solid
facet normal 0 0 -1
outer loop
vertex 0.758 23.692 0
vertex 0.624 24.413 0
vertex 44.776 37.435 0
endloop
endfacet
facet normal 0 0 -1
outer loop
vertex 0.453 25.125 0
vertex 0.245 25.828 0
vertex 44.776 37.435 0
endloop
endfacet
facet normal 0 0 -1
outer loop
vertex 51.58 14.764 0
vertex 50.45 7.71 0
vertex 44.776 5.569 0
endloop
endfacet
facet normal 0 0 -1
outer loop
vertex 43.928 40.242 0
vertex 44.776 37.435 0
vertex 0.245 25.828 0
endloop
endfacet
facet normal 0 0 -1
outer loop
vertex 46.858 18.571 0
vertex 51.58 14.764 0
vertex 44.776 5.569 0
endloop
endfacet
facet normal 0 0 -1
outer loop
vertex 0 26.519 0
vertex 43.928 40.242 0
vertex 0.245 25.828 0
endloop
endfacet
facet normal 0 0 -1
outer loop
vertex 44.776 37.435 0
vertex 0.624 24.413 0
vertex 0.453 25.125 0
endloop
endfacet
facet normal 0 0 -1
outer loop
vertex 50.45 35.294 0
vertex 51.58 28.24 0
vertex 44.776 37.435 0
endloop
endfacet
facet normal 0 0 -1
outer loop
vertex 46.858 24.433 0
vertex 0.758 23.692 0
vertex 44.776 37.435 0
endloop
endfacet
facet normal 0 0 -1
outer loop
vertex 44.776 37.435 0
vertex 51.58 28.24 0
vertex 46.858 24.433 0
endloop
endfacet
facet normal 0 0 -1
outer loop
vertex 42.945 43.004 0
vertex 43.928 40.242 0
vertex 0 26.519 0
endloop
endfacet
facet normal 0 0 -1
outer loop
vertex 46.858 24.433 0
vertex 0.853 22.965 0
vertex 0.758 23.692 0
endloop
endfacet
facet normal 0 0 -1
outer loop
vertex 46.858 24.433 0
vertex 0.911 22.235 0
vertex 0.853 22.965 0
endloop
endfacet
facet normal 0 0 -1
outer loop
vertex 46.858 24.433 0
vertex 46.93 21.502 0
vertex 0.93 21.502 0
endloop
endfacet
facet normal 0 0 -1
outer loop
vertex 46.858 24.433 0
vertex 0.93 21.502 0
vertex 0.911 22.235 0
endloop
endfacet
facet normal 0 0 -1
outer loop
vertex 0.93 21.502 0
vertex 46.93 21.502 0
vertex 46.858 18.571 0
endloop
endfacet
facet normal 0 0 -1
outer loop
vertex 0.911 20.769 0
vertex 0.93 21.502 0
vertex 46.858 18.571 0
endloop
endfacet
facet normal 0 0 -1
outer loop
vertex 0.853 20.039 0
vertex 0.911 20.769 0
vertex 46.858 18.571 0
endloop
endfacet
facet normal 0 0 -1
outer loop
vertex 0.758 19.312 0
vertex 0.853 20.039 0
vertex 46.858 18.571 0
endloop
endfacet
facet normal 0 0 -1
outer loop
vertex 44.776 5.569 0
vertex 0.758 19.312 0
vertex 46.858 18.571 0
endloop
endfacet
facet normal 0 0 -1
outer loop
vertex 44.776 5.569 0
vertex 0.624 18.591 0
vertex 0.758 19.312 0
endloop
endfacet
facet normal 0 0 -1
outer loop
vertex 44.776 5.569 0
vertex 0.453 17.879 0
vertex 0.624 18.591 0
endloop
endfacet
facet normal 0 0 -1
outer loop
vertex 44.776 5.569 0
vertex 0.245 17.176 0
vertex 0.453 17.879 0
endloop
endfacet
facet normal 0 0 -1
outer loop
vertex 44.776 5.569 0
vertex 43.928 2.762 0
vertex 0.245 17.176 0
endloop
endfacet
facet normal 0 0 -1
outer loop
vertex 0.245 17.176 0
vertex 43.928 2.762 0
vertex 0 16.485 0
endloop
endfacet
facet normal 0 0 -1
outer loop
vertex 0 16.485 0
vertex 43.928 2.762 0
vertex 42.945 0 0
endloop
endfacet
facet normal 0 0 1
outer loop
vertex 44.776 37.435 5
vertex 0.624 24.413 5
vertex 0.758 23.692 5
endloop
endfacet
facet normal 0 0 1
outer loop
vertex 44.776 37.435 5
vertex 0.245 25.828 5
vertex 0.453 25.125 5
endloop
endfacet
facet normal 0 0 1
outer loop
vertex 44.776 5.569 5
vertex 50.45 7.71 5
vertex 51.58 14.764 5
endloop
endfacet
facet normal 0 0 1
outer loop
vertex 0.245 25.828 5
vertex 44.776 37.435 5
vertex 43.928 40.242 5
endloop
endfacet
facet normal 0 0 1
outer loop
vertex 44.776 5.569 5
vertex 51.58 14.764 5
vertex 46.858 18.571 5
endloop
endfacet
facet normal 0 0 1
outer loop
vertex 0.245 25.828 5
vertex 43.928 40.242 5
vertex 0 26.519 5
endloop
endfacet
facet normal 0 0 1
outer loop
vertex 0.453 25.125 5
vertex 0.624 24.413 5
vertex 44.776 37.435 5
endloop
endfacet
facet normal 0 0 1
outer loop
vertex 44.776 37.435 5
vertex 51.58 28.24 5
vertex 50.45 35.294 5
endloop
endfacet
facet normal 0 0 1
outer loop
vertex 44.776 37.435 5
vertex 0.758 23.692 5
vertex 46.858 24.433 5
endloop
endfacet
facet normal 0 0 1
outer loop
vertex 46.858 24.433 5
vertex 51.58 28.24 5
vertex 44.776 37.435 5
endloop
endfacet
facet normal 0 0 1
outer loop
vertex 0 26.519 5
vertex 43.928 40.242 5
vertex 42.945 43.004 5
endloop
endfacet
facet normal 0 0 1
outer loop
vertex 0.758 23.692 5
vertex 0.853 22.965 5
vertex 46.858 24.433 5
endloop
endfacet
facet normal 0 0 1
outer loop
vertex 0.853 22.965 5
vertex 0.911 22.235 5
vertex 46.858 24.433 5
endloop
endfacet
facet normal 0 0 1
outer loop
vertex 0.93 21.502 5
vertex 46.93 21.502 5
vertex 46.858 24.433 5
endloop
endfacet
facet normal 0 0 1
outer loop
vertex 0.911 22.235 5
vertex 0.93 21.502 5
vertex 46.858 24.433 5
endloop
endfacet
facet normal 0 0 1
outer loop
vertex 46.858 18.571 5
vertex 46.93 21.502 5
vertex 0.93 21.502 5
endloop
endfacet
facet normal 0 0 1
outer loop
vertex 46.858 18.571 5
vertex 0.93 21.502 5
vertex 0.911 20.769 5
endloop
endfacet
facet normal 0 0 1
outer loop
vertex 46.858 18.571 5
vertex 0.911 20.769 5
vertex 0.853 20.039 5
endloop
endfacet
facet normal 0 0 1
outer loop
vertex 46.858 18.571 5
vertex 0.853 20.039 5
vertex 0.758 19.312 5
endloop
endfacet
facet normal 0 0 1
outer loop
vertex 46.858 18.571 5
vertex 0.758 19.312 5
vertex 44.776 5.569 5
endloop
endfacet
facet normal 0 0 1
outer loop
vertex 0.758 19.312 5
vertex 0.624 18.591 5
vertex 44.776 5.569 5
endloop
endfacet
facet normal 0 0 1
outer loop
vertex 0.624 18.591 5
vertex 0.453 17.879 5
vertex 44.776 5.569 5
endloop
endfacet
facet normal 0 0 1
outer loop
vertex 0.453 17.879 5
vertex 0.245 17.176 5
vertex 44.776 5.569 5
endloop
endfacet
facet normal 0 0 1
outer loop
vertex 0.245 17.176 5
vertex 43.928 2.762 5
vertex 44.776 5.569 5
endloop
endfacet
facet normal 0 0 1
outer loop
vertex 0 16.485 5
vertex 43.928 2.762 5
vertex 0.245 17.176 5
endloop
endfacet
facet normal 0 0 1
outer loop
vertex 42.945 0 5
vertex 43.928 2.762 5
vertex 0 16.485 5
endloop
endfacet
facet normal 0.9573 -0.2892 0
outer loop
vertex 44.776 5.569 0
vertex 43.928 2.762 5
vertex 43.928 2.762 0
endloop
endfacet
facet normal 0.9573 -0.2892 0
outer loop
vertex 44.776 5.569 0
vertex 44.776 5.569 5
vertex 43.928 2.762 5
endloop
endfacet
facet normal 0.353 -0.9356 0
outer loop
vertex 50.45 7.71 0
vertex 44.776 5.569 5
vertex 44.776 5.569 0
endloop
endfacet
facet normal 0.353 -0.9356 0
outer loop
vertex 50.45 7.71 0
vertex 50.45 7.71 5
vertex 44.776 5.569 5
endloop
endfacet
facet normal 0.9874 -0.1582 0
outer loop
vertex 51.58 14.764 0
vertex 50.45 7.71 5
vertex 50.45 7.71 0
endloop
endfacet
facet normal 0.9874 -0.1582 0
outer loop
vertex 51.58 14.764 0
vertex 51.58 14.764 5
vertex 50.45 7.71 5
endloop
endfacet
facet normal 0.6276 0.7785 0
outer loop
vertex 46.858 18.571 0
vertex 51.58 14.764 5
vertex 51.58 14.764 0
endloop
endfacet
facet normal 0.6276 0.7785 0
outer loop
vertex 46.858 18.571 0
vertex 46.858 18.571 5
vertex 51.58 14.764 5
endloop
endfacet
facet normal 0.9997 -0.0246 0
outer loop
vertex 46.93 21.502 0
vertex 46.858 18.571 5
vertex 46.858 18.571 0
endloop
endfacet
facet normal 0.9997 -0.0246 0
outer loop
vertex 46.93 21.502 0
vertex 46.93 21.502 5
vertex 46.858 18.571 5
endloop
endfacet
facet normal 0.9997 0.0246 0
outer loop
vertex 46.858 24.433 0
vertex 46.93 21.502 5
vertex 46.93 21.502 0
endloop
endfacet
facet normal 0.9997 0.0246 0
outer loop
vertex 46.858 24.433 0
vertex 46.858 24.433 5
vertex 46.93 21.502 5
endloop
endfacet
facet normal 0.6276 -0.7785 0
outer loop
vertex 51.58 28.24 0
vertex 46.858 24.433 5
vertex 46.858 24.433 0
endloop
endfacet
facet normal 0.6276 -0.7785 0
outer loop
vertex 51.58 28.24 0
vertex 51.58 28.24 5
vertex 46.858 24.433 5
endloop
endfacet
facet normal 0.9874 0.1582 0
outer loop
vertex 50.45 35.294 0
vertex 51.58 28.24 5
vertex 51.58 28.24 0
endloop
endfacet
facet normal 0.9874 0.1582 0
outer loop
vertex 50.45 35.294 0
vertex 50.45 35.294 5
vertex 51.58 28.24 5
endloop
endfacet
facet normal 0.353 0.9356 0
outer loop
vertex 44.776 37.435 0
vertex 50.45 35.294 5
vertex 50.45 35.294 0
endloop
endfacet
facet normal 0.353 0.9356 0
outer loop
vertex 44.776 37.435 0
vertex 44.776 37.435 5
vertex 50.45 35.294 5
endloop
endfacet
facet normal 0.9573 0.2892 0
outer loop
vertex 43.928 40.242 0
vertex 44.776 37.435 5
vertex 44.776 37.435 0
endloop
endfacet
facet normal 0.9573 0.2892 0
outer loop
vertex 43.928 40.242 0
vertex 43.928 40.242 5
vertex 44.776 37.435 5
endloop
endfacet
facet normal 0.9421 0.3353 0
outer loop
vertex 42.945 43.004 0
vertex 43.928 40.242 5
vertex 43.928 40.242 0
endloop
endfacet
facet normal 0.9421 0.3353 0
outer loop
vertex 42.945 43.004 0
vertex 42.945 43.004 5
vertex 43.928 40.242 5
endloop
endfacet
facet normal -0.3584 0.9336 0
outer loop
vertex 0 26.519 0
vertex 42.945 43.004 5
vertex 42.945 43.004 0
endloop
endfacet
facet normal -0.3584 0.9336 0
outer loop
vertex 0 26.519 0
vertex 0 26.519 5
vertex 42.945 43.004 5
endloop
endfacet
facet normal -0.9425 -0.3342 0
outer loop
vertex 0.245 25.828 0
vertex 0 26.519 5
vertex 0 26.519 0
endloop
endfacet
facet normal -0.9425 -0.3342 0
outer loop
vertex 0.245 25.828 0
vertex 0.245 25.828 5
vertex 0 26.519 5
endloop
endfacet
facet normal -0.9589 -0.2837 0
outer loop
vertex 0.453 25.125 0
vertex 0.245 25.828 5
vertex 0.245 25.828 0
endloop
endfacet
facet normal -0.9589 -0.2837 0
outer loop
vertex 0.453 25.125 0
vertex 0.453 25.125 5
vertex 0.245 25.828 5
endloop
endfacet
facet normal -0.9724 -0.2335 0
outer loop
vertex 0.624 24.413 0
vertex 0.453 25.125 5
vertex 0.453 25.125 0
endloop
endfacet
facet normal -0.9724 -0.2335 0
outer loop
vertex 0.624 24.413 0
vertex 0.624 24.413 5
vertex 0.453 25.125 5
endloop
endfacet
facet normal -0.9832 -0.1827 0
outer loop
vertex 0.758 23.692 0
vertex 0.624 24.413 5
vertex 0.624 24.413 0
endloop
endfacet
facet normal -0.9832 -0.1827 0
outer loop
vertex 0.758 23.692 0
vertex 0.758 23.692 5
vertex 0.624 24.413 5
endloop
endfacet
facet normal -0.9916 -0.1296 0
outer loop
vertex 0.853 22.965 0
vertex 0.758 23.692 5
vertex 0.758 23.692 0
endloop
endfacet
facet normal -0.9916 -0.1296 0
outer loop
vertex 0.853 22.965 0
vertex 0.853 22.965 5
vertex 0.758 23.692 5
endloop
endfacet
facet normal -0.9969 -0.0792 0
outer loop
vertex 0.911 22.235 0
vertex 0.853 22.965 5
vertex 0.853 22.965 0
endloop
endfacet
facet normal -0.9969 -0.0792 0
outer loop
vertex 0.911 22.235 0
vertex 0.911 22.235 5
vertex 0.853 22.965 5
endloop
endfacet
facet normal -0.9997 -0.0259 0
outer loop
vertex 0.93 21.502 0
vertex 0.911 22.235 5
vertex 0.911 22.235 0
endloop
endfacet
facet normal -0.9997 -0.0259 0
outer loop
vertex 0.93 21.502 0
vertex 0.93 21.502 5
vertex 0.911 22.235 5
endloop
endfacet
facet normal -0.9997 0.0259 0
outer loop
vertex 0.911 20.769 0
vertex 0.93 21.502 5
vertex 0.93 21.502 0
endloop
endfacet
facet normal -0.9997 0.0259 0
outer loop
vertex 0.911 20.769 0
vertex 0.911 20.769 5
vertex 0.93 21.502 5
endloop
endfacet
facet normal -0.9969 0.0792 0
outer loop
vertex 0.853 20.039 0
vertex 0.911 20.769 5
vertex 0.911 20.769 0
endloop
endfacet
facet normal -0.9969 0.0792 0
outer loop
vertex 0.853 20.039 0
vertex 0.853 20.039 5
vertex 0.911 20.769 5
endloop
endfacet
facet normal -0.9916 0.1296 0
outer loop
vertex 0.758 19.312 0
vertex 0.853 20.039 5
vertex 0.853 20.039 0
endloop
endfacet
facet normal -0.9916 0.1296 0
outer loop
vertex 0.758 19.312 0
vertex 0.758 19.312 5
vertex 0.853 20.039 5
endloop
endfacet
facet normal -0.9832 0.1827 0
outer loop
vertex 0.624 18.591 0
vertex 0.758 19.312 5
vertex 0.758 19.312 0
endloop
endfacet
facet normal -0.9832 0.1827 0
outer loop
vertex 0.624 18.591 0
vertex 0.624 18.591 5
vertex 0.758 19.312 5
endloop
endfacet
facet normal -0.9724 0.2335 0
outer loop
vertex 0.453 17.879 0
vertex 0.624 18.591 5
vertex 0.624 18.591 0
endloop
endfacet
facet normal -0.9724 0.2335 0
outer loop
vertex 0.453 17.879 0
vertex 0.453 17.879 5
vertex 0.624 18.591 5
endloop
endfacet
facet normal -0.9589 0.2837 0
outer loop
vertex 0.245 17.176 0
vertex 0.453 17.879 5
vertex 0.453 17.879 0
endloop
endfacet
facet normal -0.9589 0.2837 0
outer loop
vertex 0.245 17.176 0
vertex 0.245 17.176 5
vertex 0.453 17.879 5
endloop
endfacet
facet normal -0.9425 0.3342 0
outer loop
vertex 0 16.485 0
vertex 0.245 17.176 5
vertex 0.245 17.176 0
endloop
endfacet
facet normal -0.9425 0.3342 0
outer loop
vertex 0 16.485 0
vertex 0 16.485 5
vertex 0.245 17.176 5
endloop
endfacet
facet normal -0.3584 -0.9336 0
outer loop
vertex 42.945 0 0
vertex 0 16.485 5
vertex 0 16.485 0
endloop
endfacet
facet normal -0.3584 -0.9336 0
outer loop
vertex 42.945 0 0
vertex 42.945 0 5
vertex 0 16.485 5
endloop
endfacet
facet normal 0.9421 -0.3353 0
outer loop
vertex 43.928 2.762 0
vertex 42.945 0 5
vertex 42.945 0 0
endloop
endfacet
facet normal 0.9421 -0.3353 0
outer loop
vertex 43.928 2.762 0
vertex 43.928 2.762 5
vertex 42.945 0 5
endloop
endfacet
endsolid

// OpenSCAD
$fn = 32;

// ----------------------------------------------------------------------
// Gear sector: 2 teeth on 42 degrees
// ----------------------------------------------------------------------

// --- parameters (mm) ---
sector_angle = 42;        // sector angle, degrees
root_r = 60;              // root circle radius
tooth_h = 5;              // tooth height over the root circle
teeth = 2;                // number of teeth on the sector
hub_r = 14;               // hub bore radius
plate_t = 5;              // sector thickness, Z
arc_step = 3;             // sampling step of the root/hub arcs, degrees
fit_tol = 0.02;           // declared fit tolerance (prompt contract)
free_tol = 0.2;           // declared free tolerance (prompt contract)

tip_r = root_r + tooth_h;  // tip circle radius

profile = [[42.945, 0], [43.928, 2.762], [44.776, 5.569], [50.45, 7.71], [51.58, 14.764], [46.858, 18.571], [46.93, 21.502], [46.858, 24.433], [51.58, 28.24], [50.45, 35.294], [44.776, 37.435], [43.928, 40.242], [42.945, 43.004], [0, 26.519], [0.245, 25.828], [0.453, 25.125], [0.624, 24.413], [0.758, 23.692], [0.853, 22.965], [0.911, 22.235], [0.93, 21.502], [0.911, 20.769], [0.853, 20.039], [0.758, 19.312], [0.624, 18.591], [0.453, 17.879], [0.245, 17.176], [0, 16.485]];  // primary outline, 28 points, counter clockwise

// --- the one profile operation ---
linear_extrude(height = plate_t) polygon(points = profile);
